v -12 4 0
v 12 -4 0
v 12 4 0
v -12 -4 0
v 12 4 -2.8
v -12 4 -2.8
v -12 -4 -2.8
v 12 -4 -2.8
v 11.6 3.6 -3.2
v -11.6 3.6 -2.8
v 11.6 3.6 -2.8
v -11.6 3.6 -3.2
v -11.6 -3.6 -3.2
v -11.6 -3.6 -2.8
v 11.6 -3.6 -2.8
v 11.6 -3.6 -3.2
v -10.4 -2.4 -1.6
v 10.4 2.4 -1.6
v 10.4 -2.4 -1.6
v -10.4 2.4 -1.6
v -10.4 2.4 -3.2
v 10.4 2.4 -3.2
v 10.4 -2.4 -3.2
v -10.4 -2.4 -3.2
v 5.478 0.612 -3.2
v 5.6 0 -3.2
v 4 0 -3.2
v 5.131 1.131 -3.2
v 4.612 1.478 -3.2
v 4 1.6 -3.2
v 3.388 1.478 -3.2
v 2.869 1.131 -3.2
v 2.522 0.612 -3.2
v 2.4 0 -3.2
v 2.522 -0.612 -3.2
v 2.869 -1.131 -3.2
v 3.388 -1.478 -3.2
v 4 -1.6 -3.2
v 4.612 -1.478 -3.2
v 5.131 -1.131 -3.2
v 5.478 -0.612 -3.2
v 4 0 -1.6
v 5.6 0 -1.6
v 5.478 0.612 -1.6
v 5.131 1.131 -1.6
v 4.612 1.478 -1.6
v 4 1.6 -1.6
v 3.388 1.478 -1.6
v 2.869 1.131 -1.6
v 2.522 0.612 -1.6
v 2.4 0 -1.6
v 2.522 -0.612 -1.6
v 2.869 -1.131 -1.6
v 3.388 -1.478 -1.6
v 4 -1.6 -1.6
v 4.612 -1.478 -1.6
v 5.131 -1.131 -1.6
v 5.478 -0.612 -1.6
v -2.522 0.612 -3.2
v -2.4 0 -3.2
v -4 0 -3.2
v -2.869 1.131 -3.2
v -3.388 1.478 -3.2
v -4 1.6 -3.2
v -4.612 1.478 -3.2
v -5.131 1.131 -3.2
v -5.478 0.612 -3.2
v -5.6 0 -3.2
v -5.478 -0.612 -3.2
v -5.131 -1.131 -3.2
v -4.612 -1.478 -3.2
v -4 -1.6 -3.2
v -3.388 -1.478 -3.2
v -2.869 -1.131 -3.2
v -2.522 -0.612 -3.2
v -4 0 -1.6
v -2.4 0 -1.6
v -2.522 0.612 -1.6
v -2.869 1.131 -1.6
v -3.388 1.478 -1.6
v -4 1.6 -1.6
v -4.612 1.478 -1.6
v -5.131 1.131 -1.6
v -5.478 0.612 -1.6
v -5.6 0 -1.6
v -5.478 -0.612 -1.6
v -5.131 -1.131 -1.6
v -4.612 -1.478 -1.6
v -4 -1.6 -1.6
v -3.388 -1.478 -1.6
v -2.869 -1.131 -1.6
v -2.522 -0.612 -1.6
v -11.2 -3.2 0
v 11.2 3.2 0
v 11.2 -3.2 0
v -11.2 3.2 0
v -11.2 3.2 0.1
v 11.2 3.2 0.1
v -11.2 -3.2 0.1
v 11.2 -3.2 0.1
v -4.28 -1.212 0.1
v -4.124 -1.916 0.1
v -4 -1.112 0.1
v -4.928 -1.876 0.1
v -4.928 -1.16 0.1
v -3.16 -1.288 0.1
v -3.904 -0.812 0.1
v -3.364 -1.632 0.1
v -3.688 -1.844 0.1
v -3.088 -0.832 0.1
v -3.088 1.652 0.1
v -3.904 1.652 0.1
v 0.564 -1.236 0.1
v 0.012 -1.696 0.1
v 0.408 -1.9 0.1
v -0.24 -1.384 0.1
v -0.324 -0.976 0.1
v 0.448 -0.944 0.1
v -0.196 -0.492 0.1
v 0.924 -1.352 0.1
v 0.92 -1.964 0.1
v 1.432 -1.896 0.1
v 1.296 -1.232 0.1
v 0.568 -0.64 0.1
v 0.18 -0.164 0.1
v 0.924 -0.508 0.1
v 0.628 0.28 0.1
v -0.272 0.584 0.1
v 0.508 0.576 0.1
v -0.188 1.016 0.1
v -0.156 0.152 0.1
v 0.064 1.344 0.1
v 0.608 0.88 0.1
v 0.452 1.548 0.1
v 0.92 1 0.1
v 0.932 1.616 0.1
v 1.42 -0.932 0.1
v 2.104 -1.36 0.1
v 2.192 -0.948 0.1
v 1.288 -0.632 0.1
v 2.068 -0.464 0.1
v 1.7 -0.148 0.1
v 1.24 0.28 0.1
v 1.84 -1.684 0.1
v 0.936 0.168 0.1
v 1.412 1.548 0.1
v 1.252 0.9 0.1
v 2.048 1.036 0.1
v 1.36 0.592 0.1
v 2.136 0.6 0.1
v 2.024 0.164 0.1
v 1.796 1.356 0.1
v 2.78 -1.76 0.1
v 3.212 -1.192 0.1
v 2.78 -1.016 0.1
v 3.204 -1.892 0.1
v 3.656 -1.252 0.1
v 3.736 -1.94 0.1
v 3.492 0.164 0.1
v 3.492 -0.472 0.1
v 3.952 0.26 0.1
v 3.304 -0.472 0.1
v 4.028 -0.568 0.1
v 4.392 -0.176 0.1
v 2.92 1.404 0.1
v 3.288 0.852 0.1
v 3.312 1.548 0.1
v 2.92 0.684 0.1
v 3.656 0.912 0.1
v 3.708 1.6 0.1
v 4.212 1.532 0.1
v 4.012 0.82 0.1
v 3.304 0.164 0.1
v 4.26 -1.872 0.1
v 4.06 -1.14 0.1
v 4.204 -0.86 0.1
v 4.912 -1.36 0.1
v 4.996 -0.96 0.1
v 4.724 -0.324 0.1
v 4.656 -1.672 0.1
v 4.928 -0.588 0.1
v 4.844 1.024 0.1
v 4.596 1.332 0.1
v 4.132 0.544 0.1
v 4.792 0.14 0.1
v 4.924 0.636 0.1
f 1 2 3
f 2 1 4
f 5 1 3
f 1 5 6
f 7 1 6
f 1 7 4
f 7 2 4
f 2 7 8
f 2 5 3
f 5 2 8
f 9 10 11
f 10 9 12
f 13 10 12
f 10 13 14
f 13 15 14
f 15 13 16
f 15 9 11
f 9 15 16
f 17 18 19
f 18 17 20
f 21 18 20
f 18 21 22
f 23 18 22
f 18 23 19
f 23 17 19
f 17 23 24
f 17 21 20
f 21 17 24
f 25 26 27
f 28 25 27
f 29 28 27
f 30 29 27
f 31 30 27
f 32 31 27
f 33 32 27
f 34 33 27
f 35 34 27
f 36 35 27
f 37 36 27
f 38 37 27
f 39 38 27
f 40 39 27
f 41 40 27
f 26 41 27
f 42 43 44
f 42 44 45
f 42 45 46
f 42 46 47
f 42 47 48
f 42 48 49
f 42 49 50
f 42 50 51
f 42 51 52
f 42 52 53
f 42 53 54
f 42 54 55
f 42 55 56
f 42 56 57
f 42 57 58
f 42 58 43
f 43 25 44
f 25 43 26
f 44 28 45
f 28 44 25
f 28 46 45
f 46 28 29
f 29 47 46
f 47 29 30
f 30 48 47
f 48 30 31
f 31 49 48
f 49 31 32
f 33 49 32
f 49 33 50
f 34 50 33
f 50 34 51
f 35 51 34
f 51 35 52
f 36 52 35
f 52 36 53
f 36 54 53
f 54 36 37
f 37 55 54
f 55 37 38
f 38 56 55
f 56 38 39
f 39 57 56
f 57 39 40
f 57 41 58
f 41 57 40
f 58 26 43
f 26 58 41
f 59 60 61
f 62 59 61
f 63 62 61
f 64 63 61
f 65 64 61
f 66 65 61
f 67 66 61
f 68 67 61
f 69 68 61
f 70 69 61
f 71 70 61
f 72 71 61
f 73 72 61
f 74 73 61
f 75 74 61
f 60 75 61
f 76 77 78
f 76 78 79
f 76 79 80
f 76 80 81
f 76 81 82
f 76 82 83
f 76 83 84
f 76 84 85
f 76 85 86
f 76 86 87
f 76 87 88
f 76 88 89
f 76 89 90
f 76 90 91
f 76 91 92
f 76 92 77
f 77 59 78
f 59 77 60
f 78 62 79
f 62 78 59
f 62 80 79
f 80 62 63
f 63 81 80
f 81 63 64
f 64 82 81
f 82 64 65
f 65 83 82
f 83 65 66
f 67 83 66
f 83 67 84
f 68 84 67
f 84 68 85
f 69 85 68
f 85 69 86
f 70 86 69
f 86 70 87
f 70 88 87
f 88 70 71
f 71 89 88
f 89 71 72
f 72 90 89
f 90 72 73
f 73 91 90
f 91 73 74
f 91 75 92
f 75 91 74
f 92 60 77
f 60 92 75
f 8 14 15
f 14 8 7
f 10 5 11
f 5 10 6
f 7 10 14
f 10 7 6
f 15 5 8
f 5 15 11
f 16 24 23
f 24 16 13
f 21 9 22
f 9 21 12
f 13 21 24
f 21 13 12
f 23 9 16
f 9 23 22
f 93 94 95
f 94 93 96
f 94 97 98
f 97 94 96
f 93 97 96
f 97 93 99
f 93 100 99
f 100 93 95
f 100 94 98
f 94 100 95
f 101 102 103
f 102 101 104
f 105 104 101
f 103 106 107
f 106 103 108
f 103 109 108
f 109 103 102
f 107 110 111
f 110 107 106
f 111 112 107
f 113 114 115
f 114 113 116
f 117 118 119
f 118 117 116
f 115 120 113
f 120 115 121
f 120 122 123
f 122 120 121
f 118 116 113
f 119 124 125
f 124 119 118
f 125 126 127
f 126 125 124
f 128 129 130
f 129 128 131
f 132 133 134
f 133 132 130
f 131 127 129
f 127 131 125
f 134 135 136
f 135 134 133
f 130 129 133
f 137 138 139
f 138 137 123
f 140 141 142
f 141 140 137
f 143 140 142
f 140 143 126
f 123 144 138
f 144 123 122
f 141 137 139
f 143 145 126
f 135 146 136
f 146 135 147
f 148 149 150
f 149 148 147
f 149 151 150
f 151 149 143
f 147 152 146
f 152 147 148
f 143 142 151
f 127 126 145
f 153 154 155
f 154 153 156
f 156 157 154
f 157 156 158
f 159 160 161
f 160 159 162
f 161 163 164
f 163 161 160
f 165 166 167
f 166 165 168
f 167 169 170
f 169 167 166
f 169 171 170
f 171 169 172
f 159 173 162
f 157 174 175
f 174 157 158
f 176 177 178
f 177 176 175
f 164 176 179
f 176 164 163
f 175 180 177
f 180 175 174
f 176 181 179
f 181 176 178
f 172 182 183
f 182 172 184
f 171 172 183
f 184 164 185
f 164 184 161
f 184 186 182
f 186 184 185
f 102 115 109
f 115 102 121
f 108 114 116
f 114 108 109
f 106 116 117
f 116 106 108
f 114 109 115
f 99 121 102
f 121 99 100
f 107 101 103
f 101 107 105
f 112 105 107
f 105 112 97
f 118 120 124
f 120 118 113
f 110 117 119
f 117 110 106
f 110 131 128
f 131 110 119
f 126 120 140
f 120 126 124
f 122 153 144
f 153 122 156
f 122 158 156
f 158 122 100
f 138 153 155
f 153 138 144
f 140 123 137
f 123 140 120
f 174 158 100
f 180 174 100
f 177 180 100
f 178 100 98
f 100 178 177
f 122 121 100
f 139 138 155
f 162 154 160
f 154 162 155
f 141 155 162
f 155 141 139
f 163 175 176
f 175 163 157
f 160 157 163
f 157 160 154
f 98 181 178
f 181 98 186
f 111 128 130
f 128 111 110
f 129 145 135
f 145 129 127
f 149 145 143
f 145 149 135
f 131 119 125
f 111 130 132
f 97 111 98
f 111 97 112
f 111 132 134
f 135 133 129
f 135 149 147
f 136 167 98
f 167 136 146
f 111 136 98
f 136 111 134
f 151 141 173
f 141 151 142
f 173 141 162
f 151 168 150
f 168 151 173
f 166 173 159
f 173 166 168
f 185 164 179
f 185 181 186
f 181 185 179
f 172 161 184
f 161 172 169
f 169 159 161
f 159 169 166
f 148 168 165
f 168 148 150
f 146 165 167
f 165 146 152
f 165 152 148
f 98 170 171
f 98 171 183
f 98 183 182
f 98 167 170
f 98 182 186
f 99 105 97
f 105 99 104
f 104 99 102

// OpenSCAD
// file: ../p/4-4edge.scad
use <../lib.scad>
function ldraw_lib__4_4edge() = [
// 0 Circle 1.0
// 0 Name: 4-4edge.dat
// 0 Author: James Jessiman
// 0 !LDRAW_ORG Primitive UPDATE 2017-01
// 0 !LICENSE Licensed under CC BY 2.0 and CC BY 4.0 : see CAreadme.txt
// 
// 0 BFC CERTIFY CCW
  [0,"BFC","CERTIFY"],
  [0,"BFC","CCW"],
// 
// 0 !HISTORY 1998-12-15 [PTadmin] Official Update 1998-10
// 0 !HISTORY 2005-12-28 [PTadmin] Official Update 2005-01
// 0 !HISTORY 2007-06-24 [PTadmin] Header formatted for Contributor Agreement
// 0 !HISTORY 2008-07-01 [PTadmin] Official Update 2008-01
// 0 !HISTORY 2017-01-15 [Steffen] BFCed
// 0 !HISTORY 2017-12-30 [PTadmin] Official Update 2017-01
// 
// 
// 2 24 1 0 0 0.9239 0 0.3827
  [2,24,1,0,0,0.9239,0,0.3827],
// 2 24 0.9239 0 0.3827 0.7071 0 0.7071
  [2,24,0.9239,0,0.3827,0.7071,0,0.7071],
// 2 24 0.7071 0 0.7071 0.3827 0 0.9239
  [2,24,0.7071,0,0.7071,0.3827,0,0.9239],
// 2 24 0.3827 0 0.9239 0 0 1
  [2,24,0.3827,0,0.9239,0,0,1],
// 2 24 0 0 1 -0.3827 0 0.9239
  [2,24,0,0,1,-0.3827,0,0.9239],
// 2 24 -0.3827 0 0.9239 -0.7071 0 0.7071
  [2,24,-0.3827,0,0.9239,-0.7071,0,0.7071],
// 2 24 -0.7071 0 0.7071 -0.9239 0 0.3827
  [2,24,-0.7071,0,0.7071,-0.9239,0,0.3827],
// 2 24 -0.9239 0 0.3827 -1 0 -0
  [2,24,-0.9239,0,0.3827,-1,0,-0],
// 2 24 -1 0 -0 -0.9239 0 -0.3827
  [2,24,-1,0,-0,-0.9239,0,-0.3827],
// 2 24 -0.9239 0 -0.3827 -0.7071 0 -0.7071
  [2,24,-0.9239,0,-0.3827,-0.7071,0,-0.7071],
// 2 24 -0.7071 0 -0.7071 -0.3827 0 -0.9239
  [2,24,-0.7071,0,-0.7071,-0.3827,0,-0.9239],
// 2 24 -0.3827 0 -0.9239 0 0 -1
  [2,24,-0.3827,0,-0.9239,0,0,-1],
// 2 24 0 0 -1 0.3827 0 -0.9239
  [2,24,0,0,-1,0.3827,0,-0.9239],
// 2 24 0.3827 0 -0.9239 0.7071 0 -0.7071
  [2,24,0.3827,0,-0.9239,0.7071,0,-0.7071],
// 2 24 0.7071 0 -0.7071 0.9239 0 -0.3827
  [2,24,0.7071,0,-0.7071,0.9239,0,-0.3827],
// 2 24 0.9239 0 -0.3827 1 0 0
  [2,24,0.9239,0,-0.3827,1,0,0],
];
module ldraw_lib__4_4edge(step=0, col=false, unit=2/5, alt=false, line=0.2, solid=!$preview)
    makepoly(ldraw_lib__4_4edge(), step=step, col=col, unit=unit, alt=alt, line=line, solid=solid);
ldraw_lib__4_4edge(line=0.2);
// file: ../p/4-4disc.scad
use <../lib.scad>
function ldraw_lib__4_4disc() = [
// 0 Disc 1.0
// 0 Name: 4-4disc.dat
// 0 Author: James Jessiman
// 0 !LDRAW_ORG Primitive UPDATE 2002-02
// 0 !LICENSE Licensed under CC BY 2.0 and CC BY 4.0 : see CAreadme.txt
// 
// 0 BFC CERTIFY CCW
  [0,"BFC","CERTIFY"],
  [0,"BFC","CCW"],
// 
// 0 !HISTORY 1998-12-15 [PTadmin] Official Update 1998-10
// 0 !HISTORY 2002-03-23 [sbliss] Added BFC statement
// 0 !HISTORY 2002-04-25 [PTadmin] Official Update 2002-02
// 0 !HISTORY 2007-06-24 [PTadmin] Header formatted for Contributor Agreement
// 0 !HISTORY 2008-07-01 [PTadmin] Official Update 2008-01
// 
// 
// 3 16 0 0 0 1 0 0 0.9239 0 0.3827
  [3,16,0,0,0,1,0,0,0.9239,0,0.3827],
// 3 16 0 0 0 0.9239 0 0.3827 0.7071 0 0.7071
  [3,16,0,0,0,0.9239,0,0.3827,0.7071,0,0.7071],
// 3 16 0 0 0 0.7071 0 0.7071 0.3827 0 0.9239
  [3,16,0,0,0,0.7071,0,0.7071,0.3827,0,0.9239],
// 3 16 0 0 0 0.3827 0 0.9239 0 0 1
  [3,16,0,0,0,0.3827,0,0.9239,0,0,1],
// 3 16 0 0 0 0 0 1 -0.3827 0 0.9239
  [3,16,0,0,0,0,0,1,-0.3827,0,0.9239],
// 3 16 0 0 0 -0.3827 0 0.9239 -0.7071 0 0.7071
  [3,16,0,0,0,-0.3827,0,0.9239,-0.7071,0,0.7071],
// 3 16 0 0 0 -0.7071 0 0.7071 -0.9239 0 0.3827
  [3,16,0,0,0,-0.7071,0,0.7071,-0.9239,0,0.3827],
// 3 16 0 0 0 -0.9239 0 0.3827 -1 0 -0
  [3,16,0,0,0,-0.9239,0,0.3827,-1,0,-0],
// 3 16 0 0 0 -1 0 -0 -0.9239 0 -0.3827
  [3,16,0,0,0,-1,0,-0,-0.9239,0,-0.3827],
// 3 16 0 0 0 -0.9239 0 -0.3827 -0.7071 0 -0.7071
  [3,16,0,0,0,-0.9239,0,-0.3827,-0.7071,0,-0.7071],
// 3 16 0 0 0 -0.7071 0 -0.7071 -0.3827 0 -0.9239
  [3,16,0,0,0,-0.7071,0,-0.7071,-0.3827,0,-0.9239],
// 3 16 0 0 0 -0.3827 0 -0.9239 0 0 -1
  [3,16,0,0,0,-0.3827,0,-0.9239,0,0,-1],
// 3 16 0 0 0 0 0 -1 0.3827 0 -0.9239
  [3,16,0,0,0,0,0,-1,0.3827,0,-0.9239],
// 3 16 0 0 0 0.3827 0 -0.9239 0.7071 0 -0.7071
  [3,16,0,0,0,0.3827,0,-0.9239,0.7071,0,-0.7071],
// 3 16 0 0 0 0.7071 0 -0.7071 0.9239 0 -0.3827
  [3,16,0,0,0,0.7071,0,-0.7071,0.9239,0,-0.3827],
// 3 16 0 0 0 0.9239 0 -0.3827 1 0 0
  [3,16,0,0,0,0.9239,0,-0.3827,1,0,0],
// 0
];
module ldraw_lib__4_4disc(step=0, col=false, unit=2/5, alt=false, line=0.2, solid=!$preview)
    makepoly(ldraw_lib__4_4disc(), step=step, col=col, unit=unit, alt=alt, line=line, solid=solid);
ldraw_lib__4_4disc(line=0.2);
// file: ../p/4-4cyli.scad
use <../lib.scad>
$fa=1; $fs=0.2;
function ldraw_lib__4_4cyli(realsolid=false) = [
// 0 Cylinder 1.0
// 0 Name: 4-4cyli.dat
// 0 Author: James Jessiman
// 0 !LDRAW_ORG Primitive UPDATE 2005-01
// 0 !LICENSE Licensed under CC BY 2.0 and CC BY 4.0 : see CAreadme.txt
// 
// 0 BFC CERTIFY CCW
  [0,"BFC","CERTIFY"],
  [0,"BFC","CCW"],
// 
// 0 !HISTORY 1998-12-15 [PTadmin] Official Update 1998-10
// 0 !HISTORY 2002-03-23 [sbliss] Added BFC statement; merged headers from files in distributions LDraw 0.27 and Complete.
// 0 !HISTORY 2002-04-25 [PTadmin] Official Update 2002-02
// 0 !HISTORY 2004-12-14 [guyvivan] BFC CCW
// 0 !HISTORY 2005-12-28 [PTadmin] Official Update 2005-01
// 0 !HISTORY 2007-06-24 [PTadmin] Header formatted for Contributor Agreement
// 0 !HISTORY 2008-07-01 [PTadmin] Official Update 2008-01
// 
// 
// 4 16 1 1 0 0.9239 1 0.3827 0.9239 0 0.3827 1 0 0
  [4,16,1,1,0,0.9239,1,0.3827,0.9239,0,0.3827,1,0,0],
// 5 24 1 0 0 1 1 0 0.9239 0 0.3827 0.9239 0 -0.3827
  [5,24,1,0,0,1,1,0,0.9239,0,0.3827,0.9239,0,-0.3827],
// 4 16 0.9239 1 0.3827 0.7071 1 0.7071 0.7071 0 0.7071 0.9239 0 0.3827
  [4,16,0.9239,1,0.3827,0.7071,1,0.7071,0.7071,0,0.7071,0.9239,0,0.3827],
// 5 24 0.9239 0 0.3827 0.9239 1 0.3827 0.7071 0 0.7071 1 0 0
  [5,24,0.9239,0,0.3827,0.9239,1,0.3827,0.7071,0,0.7071,1,0,0],
// 4 16 0.7071 1 0.7071 0.3827 1 0.9239 0.3827 0 0.9239 0.7071 0 0.7071
  [4,16,0.7071,1,0.7071,0.3827,1,0.9239,0.3827,0,0.9239,0.7071,0,0.7071],
// 5 24 0.7071 0 0.7071 0.7071 1 0.7071 0.3827 0 0.9239 0.9239 0 0.3827
  [5,24,0.7071,0,0.7071,0.7071,1,0.7071,0.3827,0,0.9239,0.9239,0,0.3827],
// 4 16 0.3827 1 0.9239 0 1 1 0 0 1 0.3827 0 0.9239
  [4,16,0.3827,1,0.9239,0,1,1,0,0,1,0.3827,0,0.9239],
// 5 24 0.3827 0 0.9239 0.3827 1 0.9239 0 0 1 0.7071 0 0.7071
  [5,24,0.3827,0,0.9239,0.3827,1,0.9239,0,0,1,0.7071,0,0.7071],
// 4 16 0 1 1 -0.3827 1 0.9239 -0.3827 0 0.9239 0 0 1
  [4,16,0,1,1,-0.3827,1,0.9239,-0.3827,0,0.9239,0,0,1],
// 5 24 0 0 1 0 1 1 -0.3827 0 0.9239 0.3827 0 0.9239
  [5,24,0,0,1,0,1,1,-0.3827,0,0.9239,0.3827,0,0.9239],
// 4 16 -0.3827 1 0.9239 -0.7071 1 0.7071 -0.7071 0 0.7071 -0.3827 0 0.9239
  [4,16,-0.3827,1,0.9239,-0.7071,1,0.7071,-0.7071,0,0.7071,-0.3827,0,0.9239],
// 5 24 -0.3827 0 0.9239 -0.3827 1 0.9239 -0.7071 0 0.7071 0 0 1
  [5,24,-0.3827,0,0.9239,-0.3827,1,0.9239,-0.7071,0,0.7071,0,0,1],
// 4 16 -0.7071 1 0.7071 -0.9239 1 0.3827 -0.9239 0 0.3827 -0.7071 0 0.7071
  [4,16,-0.7071,1,0.7071,-0.9239,1,0.3827,-0.9239,0,0.3827,-0.7071,0,0.7071],
// 5 24 -0.7071 0 0.7071 -0.7071 1 0.7071 -0.9239 0 0.3827 -0.3827 0 0.9239
  [5,24,-0.7071,0,0.7071,-0.7071,1,0.7071,-0.9239,0,0.3827,-0.3827,0,0.9239],
// 4 16 -0.9239 1 0.3827 -1 1 0 -1 0 0 -0.9239 0 0.3827
  [4,16,-0.9239,1,0.3827,-1,1,0,-1,0,0,-0.9239,0,0.3827],
// 5 24 -0.9239 0 0.3827 -0.9239 1 0.3827 -1 0 0 -0.7071 0 0.7071
  [5,24,-0.9239,0,0.3827,-0.9239,1,0.3827,-1,0,0,-0.7071,0,0.7071],
// 4 16 -1 1 0 -0.9239 1 -0.3827 -0.9239 0 -0.3827 -1 0 0
  [4,16,-1,1,0,-0.9239,1,-0.3827,-0.9239,0,-0.3827,-1,0,0],
// 5 24 -1 0 0 -1 1 0 -0.9239 0 -0.3827 -0.9239 0 0.3827
  [5,24,-1,0,0,-1,1,0,-0.9239,0,-0.3827,-0.9239,0,0.3827],
// 4 16 -0.9239 1 -0.3827 -0.7071 1 -0.7071 -0.7071 0 -0.7071 -0.9239 0 -0.3827
  [4,16,-0.9239,1,-0.3827,-0.7071,1,-0.7071,-0.7071,0,-0.7071,-0.9239,0,-0.3827],
// 5 24 -0.9239 0 -0.3827 -0.9239 1 -0.3827 -0.7071 0 -0.7071 -1 0 0
  [5,24,-0.9239,0,-0.3827,-0.9239,1,-0.3827,-0.7071,0,-0.7071,-1,0,0],
// 4 16 -0.7071 1 -0.7071 -0.3827 1 -0.9239 -0.3827 0 -0.9239 -0.7071 0 -0.7071
  [4,16,-0.7071,1,-0.7071,-0.3827,1,-0.9239,-0.3827,0,-0.9239,-0.7071,0,-0.7071],
// 5 24 -0.7071 0 -0.7071 -0.7071 1 -0.7071 -0.3827 0 -0.9239 -0.9239 0 -0.3827
  [5,24,-0.7071,0,-0.7071,-0.7071,1,-0.7071,-0.3827,0,-0.9239,-0.9239,0,-0.3827],
// 4 16 -0.3827 1 -0.9239 0 1 -1 0 0 -1 -0.3827 0 -0.9239
  [4,16,-0.3827,1,-0.9239,0,1,-1,0,0,-1,-0.3827,0,-0.9239],
// 5 24 -0.3827 0 -0.9239 -0.3827 1 -0.9239 0 0 -1 -0.7071 0 -0.7071
  [5,24,-0.3827,0,-0.9239,-0.3827,1,-0.9239,0,0,-1,-0.7071,0,-0.7071],
// 4 16 0 1 -1 0.3827 1 -0.9239 0.3827 0 -0.9239 0 0 -1
  [4,16,0,1,-1,0.3827,1,-0.9239,0.3827,0,-0.9239,0,0,-1],
// 5 24 0 0 -1 0 1 -1 0.3827 0 -0.9239 -0.3827 0 -0.9239
  [5,24,0,0,-1,0,1,-1,0.3827,0,-0.9239,-0.3827,0,-0.9239],
// 4 16 0.3827 1 -0.9239 0.7071 1 -0.7071 0.7071 0 -0.7071 0.3827 0 -0.9239
  [4,16,0.3827,1,-0.9239,0.7071,1,-0.7071,0.7071,0,-0.7071,0.3827,0,-0.9239],
// 5 24 0.3827 0 -0.9239 0.3827 1 -0.9239 0.7071 0 -0.7071 0 0 -1
  [5,24,0.3827,0,-0.9239,0.3827,1,-0.9239,0.7071,0,-0.7071,0,0,-1],
// 4 16 0.7071 1 -0.7071 0.9239 1 -0.3827 0.9239 0 -0.3827 0.7071 0 -0.7071
  [4,16,0.7071,1,-0.7071,0.9239,1,-0.3827,0.9239,0,-0.3827,0.7071,0,-0.7071],
// 5 24 0.7071 0 -0.7071 0.7071 1 -0.7071 0.9239 0 -0.3827 0.3827 0 -0.9239
  [5,24,0.7071,0,-0.7071,0.7071,1,-0.7071,0.9239,0,-0.3827,0.3827,0,-0.9239],
// 4 16 0.9239 1 -0.3827 1 1 0 1 0 0 0.9239 0 -0.3827
  [4,16,0.9239,1,-0.3827,1,1,0,1,0,0,0.9239,0,-0.3827],
// 5 24 0.9239 0 -0.3827 0.9239 1 -0.3827 1 0 0 0.7071 0 -0.7071
  [5,24,0.9239,0,-0.3827,0.9239,1,-0.3827,1,0,0,0.7071,0,-0.7071],
// 0
];
module ldraw_lib__4_4cyli(step=0, col=false, unit=2/5, alt=false, line=0.2, solid=!$preview)
    makepoly(ldraw_lib__4_4cyli(solid), step=step, col=col, unit=unit, alt=alt, line=line, solid=solid);
ldraw_lib__4_4cyli(line=0.2);
// file: ../p/stud3.scad
use <../lib.scad>
use <4-4cyli.scad>
use <4-4disc.scad>
use <4-4edge.scad>
function ldraw_lib__stud3() = [
// 0 Stud Tube Solid
// 0 Name: stud3.dat
// 0 Author: James Jessiman
// 0 !LDRAW_ORG Primitive UPDATE 2012-01
// 0 !LICENSE Licensed under CC BY 4.0 : see CAreadme.txt
// 
// 0 BFC CERTIFY CCW
  [0,"BFC","CERTIFY"],
  [0,"BFC","CCW"],
// 
// 0 !HISTORY 2002-04-04 [sbliss] Modified for BFC compliance
// 0 !HISTORY 2002-04-25 [PTadmin] Official Update 2002-02
// 0 !HISTORY 2007-06-24 [PTadmin] Header formatted for Contributor Agreement
// 0 !HISTORY 2008-07-01 [PTadmin] Official Update 2008-01
// 0 !HISTORY 2012-02-16 [Philo] Changed to CCW
// 0 !HISTORY 2012-03-30 [PTadmin] Official Update 2012-01
// 
// 
// 1 16 0 -4 0 4 0 0 0 1 0 0 0 4 4-4edge.dat
  [1,16,0,-4,0,4,0,0,0,1,0,0,0,4, ldraw_lib__4_4edge()],
// 1 16 0 0 0 4 0 0 0 1 0 0 0 4 4-4edge.dat
  [1,16,0,0,0,4,0,0,0,1,0,0,0,4, ldraw_lib__4_4edge()],
// 1 16 0 -4 0 4 0 0 0 1 0 0 0 4 4-4disc.dat
  [1,16,0,-4,0,4,0,0,0,1,0,0,0,4, ldraw_lib__4_4disc()],
  [-1,16,0,0,0,4,0,0,0,-1,0,0,0,4, ldraw_lib__4_4disc()],
// 1 16 0 -4 0 4 0 0 0 4 0 0 0 4 4-4cyli.dat
  [1,16,0,-4,0,4,0,0,0,4,0,0,0,4, ldraw_lib__4_4cyli()],
];
module ldraw_lib__stud3(step=0, col=false, unit=2/5, alt=false, line=0.2, solid=!$preview)
    makepoly(ldraw_lib__stud3(), step=step, col=col, unit=unit, alt=alt, line=line, solid=solid);
ldraw_lib__stud3(line=0.2);
// file: ../p/box5.scad
use <../lib.scad>
function ldraw_lib__box5() = [
// 0 Box with 5 Faces and All Edges
// 0 Name: box5.dat
// 0 Author: James Jessiman
// 0 !LDRAW_ORG Primitive UPDATE 2012-01
// 0 !LICENSE Licensed under CC BY 2.0 and CC BY 4.0 : see CAreadme.txt
// 
// 0 BFC CERTIFY CCW
  [0,"BFC","CERTIFY"],
  [0,"BFC","CCW"],
// 
// 0 !HISTORY 2002-04-03 [sbliss] Modified for BFC compliance
// 0 !HISTORY 2002-04-25 [PTadmin] Official Update 2002-02
// 0 !HISTORY 2007-06-24 [PTadmin] Header formatted for Contributor Agreement
// 0 !HISTORY 2008-07-01 [PTadmin] Official Update 2008-01
// 0 !HISTORY 2012-02-16 [Philo] Changed to CCW
// 0 !HISTORY 2012-03-30 [PTadmin] Official Update 2012-01
// 
// 
// 2 24 1 1 1 -1 1 1
  [2,24,1,1,1,-1,1,1],
// 2 24 -1 1 1 -1 1 -1
  [2,24,-1,1,1,-1,1,-1],
// 2 24 -1 1 -1 1 1 -1
  [2,24,-1,1,-1,1,1,-1],
// 2 24 1 1 -1 1 1 1
  [2,24,1,1,-1,1,1,1],
// 2 24 1 0 1 -1 0 1
  [2,24,1,0,1,-1,0,1],
// 2 24 -1 0 1 -1 0 -1
  [2,24,-1,0,1,-1,0,-1],
// 2 24 -1 0 -1 1 0 -1
  [2,24,-1,0,-1,1,0,-1],
// 2 24 1 0 -1 1 0 1
  [2,24,1,0,-1,1,0,1],
// 2 24 1 0 1 1 1 1
  [2,24,1,0,1,1,1,1],
// 2 24 -1 0 1 -1 1 1
  [2,24,-1,0,1,-1,1,1],
// 2 24 1 0 -1 1 1 -1
  [2,24,1,0,-1,1,1,-1],
// 2 24 -1 0 -1 -1 1 -1
  [2,24,-1,0,-1,-1,1,-1],
// 4 16 -1 1 1 1 1 1 1 1 -1 -1 1 -1
  [4,16,-1,1,1,1,1,1,1,1,-1,-1,1,-1],
// 4 16 -1 1 1 -1 0 1 1 0 1 1 1 1
  [4,16,-1,1,1,-1,0,1,1,0,1,1,1,1],
// 4 16 -1 1 -1 -1 0 -1 -1 0 1 -1 1 1
  [4,16,-1,1,-1,-1,0,-1,-1,0,1,-1,1,1],
// 4 16 1 1 -1 1 0 -1 -1 0 -1 -1 1 -1
  [4,16,1,1,-1,1,0,-1,-1,0,-1,-1,1,-1],
// 4 16 1 1 1 1 0 1 1 0 -1 1 1 -1
  [4,16,1,1,1,1,0,1,1,0,-1,1,1,-1],
];
makepoly(ldraw_lib__box5(), line=0.2);
// file: ../p/box4.scad
use <../lib.scad>
function ldraw_lib__box4() = [
// 0 Box with 4 Faces (2 Parallel Pairs) and All Edges
// 0 Name: box4.dat
// 0 Author: James Jessiman
// 0 !LDRAW_ORG Primitive UPDATE 2012-01
// 0 !LICENSE Licensed under CC BY 4.0 : see CAreadme.txt
// 
// 0 BFC CERTIFY CCW
  [0,"BFC","CERTIFY"],
  [0,"BFC","CCW"],
// 
// 0 !HISTORY 2002-04-03 [sbliss] Modified for BFC compliance
// 0 !HISTORY 2002-04-25 [PTadmin] Official Update 2002-02
// 0 !HISTORY 2007-06-24 [PTadmin] Header formatted for Contributor Agreement
// 0 !HISTORY 2008-07-01 [PTadmin] Official Update 2008-01
// 0 !HISTORY 2012-02-16 [Philo] Changed to CCW
// 0 !HISTORY 2012-03-30 [PTadmin] Official Update 2012-01
// 
// 
// 2 24 1 1 1 -1 1 1
  [2,24,1,1,1,-1,1,1],
// 2 24 -1 1 1 -1 1 -1
  [2,24,-1,1,1,-1,1,-1],
// 2 24 -1 1 -1 1 1 -1
  [2,24,-1,1,-1,1,1,-1],
// 2 24 1 1 -1 1 1 1
  [2,24,1,1,-1,1,1,1],
// 2 24 1 0 1 -1 0 1
  [2,24,1,0,1,-1,0,1],
// 2 24 -1 0 1 -1 0 -1
  [2,24,-1,0,1,-1,0,-1],
// 2 24 -1 0 -1 1 0 -1
  [2,24,-1,0,-1,1,0,-1],
// 2 24 1 0 -1 1 0 1
  [2,24,1,0,-1,1,0,1],
// 2 24 1 0 1 1 1 1
  [2,24,1,0,1,1,1,1],
// 2 24 -1 0 1 -1 1 1
  [2,24,-1,0,1,-1,1,1],
// 2 24 1 0 -1 1 1 -1
  [2,24,1,0,-1,1,1,-1],
// 2 24 -1 0 -1 -1 1 -1
  [2,24,-1,0,-1,-1,1,-1],
// 4 16 -1 1 1 -1 0 1 1 0 1 1 1 1
  [4,16,-1,1,1,-1,0,1,1,0,1,1,1,1],
// 4 16 -1 1 -1 -1 0 -1 -1 0 1 -1 1 1
  [4,16,-1,1,-1,-1,0,-1,-1,0,1,-1,1,1],
// 4 16 1 1 -1 1 0 -1 -1 0 -1 -1 1 -1
  [4,16,1,1,-1,1,0,-1,-1,0,-1,-1,1,-1],
// 4 16 1 1 1 1 0 1 1 0 -1 1 1 -1
  [4,16,1,1,1,1,0,1,1,0,-1,1,1,-1],
];
module ldraw_lib__box4(step=0, col=false, unit=2/5, alt=false, line=0.2, solid=!$preview)
    makepoly(ldraw_lib__box4(), step=step, col=col, unit=unit, alt=alt, line=line, solid=solid);
ldraw_lib__box4(line=0.2);
// file: s/63864s01.scad
use <../../lib.scad>
use <../../p/box4.scad>
use <../../p/box5.scad>
use <../../p/stud3.scad>
function ldraw_lib__s__63864s01() = [
// 0 ~Tile  1 x  3 without Top Face
// 0 Name: s\63864s01.dat
// 0 Author: Ulrich Röder [UR]
// 0 !LDRAW_ORG Subpart UPDATE 2019-01
// 0 !LICENSE Licensed under CC BY 4.0 : see CAreadme.txt
// 
// 0 BFC CERTIFY CCW
  [0,"BFC","CERTIFY"],
  [0,"BFC","CCW"],
// 
// 0 !HISTORY 2019-06-28 [PTadmin] Official Update 2019-01
// 
// 
// 1 16 0 0 0 30 0 0 0 7 0 0 0 10 box4.dat
  [1,16,0,0,0,30,0,0,0,7,0,0,0,10, ldraw_lib__box4()],
// 1 16 0 7 0 29 0 0 0 1 0 0 0 9 box4.dat
  [1,16,0,7,0,29,0,0,0,1,0,0,0,9, ldraw_lib__box4()],
// 0 BFC INVERTNEXT
  [0,"BFC","INVERTNEXT"],
// 1 16 0 8 0 -26 0 0 0 -4 0 0 0 6 box5.dat
  [1,16,0,8,0,-26,0,0,0,-4,0,0,0,6, ldraw_lib__box5()],
// 1 16 10 4 0 1 0 0 0 -1 0 0 0 1 stud3.dat
  [1,16,10,4,0,1,0,0,0,-1,0,0,0,1, ldraw_lib__stud3()],
// 1 16 -10 4 0 1 0 0 0 -1 0 0 0 1 stud3.dat
  [1,16,-10,4,0,1,0,0,0,-1,0,0,0,1, ldraw_lib__stud3()],
// 4 16 -30 7 -10 -29 7 -9 29 7 -9 30 7 -10
  [4,16,-30,7,-10,-29,7,-9,29,7,-9,30,7,-10],
// 4 16 30 7 10 29 7 9 -29 7 9 -30 7 10
  [4,16,30,7,10,29,7,9,-29,7,9,-30,7,10],
// 4 16 -30 7 -10 -30 7 10 -29 7 9 -29 7 -9
  [4,16,-30,7,-10,-30,7,10,-29,7,9,-29,7,-9],
// 4 16 30 7 10 30 7 -10 29 7 -9 29 7 9
  [4,16,30,7,10,30,7,-10,29,7,-9,29,7,9],
// 4 16 -29 8 -9 -26 8 -6 26 8 -6 29 8 -9
  [4,16,-29,8,-9,-26,8,-6,26,8,-6,29,8,-9],
// 4 16 29 8 9 26 8 6 -26 8 6 -29 8 9
  [4,16,29,8,9,26,8,6,-26,8,6,-29,8,9],
// 4 16 -29 8 -9 -29 8 9 -26 8 6 -26 8 -6
  [4,16,-29,8,-9,-29,8,9,-26,8,6,-26,8,-6],
// 4 16 29 8 9 29 8 -9 26 8 -6 26 8 6
  [4,16,29,8,9,29,8,-9,26,8,-6,26,8,6],
];
module ldraw_lib__s__63864s01(step=0, col=false, unit=2/5, alt=false, line=0.2, solid=!$preview)
    makepoly(ldraw_lib__s__63864s01(), step=step, col=col, unit=unit, alt=alt, line=line, solid=solid);
ldraw_lib__s__63864s01(line=0.2);
// file: ../p/box5-12.scad
use <../lib.scad>
function ldraw_lib__box5_12() = [
// 0 Box with 5 Faces without Any Edges
// 0 Name: box5-12.dat
// 0 Author: Chris Dee [cwdee]
// 0 !LDRAW_ORG Primitive UPDATE 2009-02
// 0 !LICENSE Licensed under CC BY 2.0 and CC BY 4.0 : see CAreadme.txt
// 
// 0 BFC CERTIFY CCW
  [0,"BFC","CERTIFY"],
  [0,"BFC","CCW"],
// 
// 0 !HISTORY 2009-09-03 [PTadmin] Official Update 2009-02
// 
// 
// 4 16 1 1 1 1 1 -1 -1 1 -1 -1 1 1
  [4,16,1,1,1,1,1,-1,-1,1,-1,-1,1,1],
// 4 16 -1 0 1 1 0 1 1 1 1 -1 1 1
  [4,16,-1,0,1,1,0,1,1,1,1,-1,1,1],
// 4 16 -1 0 -1 -1 0 1 -1 1 1 -1 1 -1
  [4,16,-1,0,-1,-1,0,1,-1,1,1,-1,1,-1],
// 4 16 1 0 -1 -1 0 -1 -1 1 -1 1 1 -1
  [4,16,1,0,-1,-1,0,-1,-1,1,-1,1,1,-1],
// 4 16 1 0 1 1 0 -1 1 1 -1 1 1 1
  [4,16,1,0,1,1,0,-1,1,1,-1,1,1,1],
// 0
];
module ldraw_lib__box5_12(step=0, col=false, unit=2/5, alt=false, line=0.2, solid=!$preview)
    makepoly(ldraw_lib__box5_12(), step=step, col=col, unit=unit, alt=alt, line=line, solid=solid);
ldraw_lib__box5_12(line=0.2);
// file: 63864.scad
use <../lib.scad>
use <s/63864s01.scad>
function ldraw_lib__63864() = [
// 0 Tile  1 x  3
// 0 Name: 63864.dat
// 0 Author: Tim Gould [timgould]
// 0 !LDRAW_ORG Part UPDATE 2019-01
// 0 !LICENSE Licensed under CC BY 2.0 and CC BY 4.0 : see CAreadme.txt
// 
// 0 BFC CERTIFY CCW
  [0,"BFC","CERTIFY"],
  [0,"BFC","CCW"],
// 
// 0 !HISTORY 2010-04-05 [PTadmin] Official Update 2010-01
// 0 !HISTORY 2019-06-28 [PTadmin] Official Update 2019-01
// 0 !HISTORY 2019-07-03 [UR] Subpart Integration
// 
// 
// 4 16 -30 0 -10 30 0 -10 30 0 10 -30 0 10
  [4,16,-30,0,-10,30,0,-10,30,0,10,-30,0,10],
// 1 16 0 0 0 1 0 0 0 1 0 0 0 1 s\63864s01.dat
  [1,16,0,0,0,1,0,0,0,1,0,0,0,1, ldraw_lib__s__63864s01()],
];
makepoly(ldraw_lib__63864(), line=0.2);
// main file
use <../lib.scad>
use <6153754l.scad>
use <63864.scad>
function ldraw_lib__63864d0k() = [
// 0 Tile  1 x  3 with Black "J 83" on Transparent Background Sticker
// 0 Name: 63864d0k.dat
// 0 Author: Magnus Forsberg [MagFors]
// 0 !LDRAW_ORG Shortcut UPDATE 2026-07
// 0 !LICENSE Licensed under CC BY 4.0 : see CAreadme.txt
// 
// 0 BFC CERTIFY CCW
  [0,"BFC","CERTIFY"],
  [0,"BFC","CCW"],
// 
// 0 !CATEGORY Sticker Shortcut
// 0 !KEYWORDS Bricklink 63864pb063, set 10252, Volkswagen Beetle
// 
// 0 !HISTORY 2026-07-30 [OrionP] Official Update 2026-07
// 
// 1 16 0 0 0 1 0 0 0 1 0 0 0 1 63864.dat
  [1,16,0,0,0,1,0,0,0,1,0,0,0,1, ldraw_lib__63864()],
// 1 16 0 0 0 1 0 0 0 1 0 0 0 1 6153754l.dat
  [1,16,0,0,0,1,0,0,0,1,0,0,0,1, ldraw_lib__6153754l()],
];
module ldraw_lib__63864d0k(step=0, col=false, unit=2/5, alt=false, line=0.2, solid=!$preview)
    makepoly(ldraw_lib__63864d0k(), step=step, col=col, unit=unit, alt=alt, line=line, solid=solid);
ldraw_lib__63864d0k(line=0.2);
